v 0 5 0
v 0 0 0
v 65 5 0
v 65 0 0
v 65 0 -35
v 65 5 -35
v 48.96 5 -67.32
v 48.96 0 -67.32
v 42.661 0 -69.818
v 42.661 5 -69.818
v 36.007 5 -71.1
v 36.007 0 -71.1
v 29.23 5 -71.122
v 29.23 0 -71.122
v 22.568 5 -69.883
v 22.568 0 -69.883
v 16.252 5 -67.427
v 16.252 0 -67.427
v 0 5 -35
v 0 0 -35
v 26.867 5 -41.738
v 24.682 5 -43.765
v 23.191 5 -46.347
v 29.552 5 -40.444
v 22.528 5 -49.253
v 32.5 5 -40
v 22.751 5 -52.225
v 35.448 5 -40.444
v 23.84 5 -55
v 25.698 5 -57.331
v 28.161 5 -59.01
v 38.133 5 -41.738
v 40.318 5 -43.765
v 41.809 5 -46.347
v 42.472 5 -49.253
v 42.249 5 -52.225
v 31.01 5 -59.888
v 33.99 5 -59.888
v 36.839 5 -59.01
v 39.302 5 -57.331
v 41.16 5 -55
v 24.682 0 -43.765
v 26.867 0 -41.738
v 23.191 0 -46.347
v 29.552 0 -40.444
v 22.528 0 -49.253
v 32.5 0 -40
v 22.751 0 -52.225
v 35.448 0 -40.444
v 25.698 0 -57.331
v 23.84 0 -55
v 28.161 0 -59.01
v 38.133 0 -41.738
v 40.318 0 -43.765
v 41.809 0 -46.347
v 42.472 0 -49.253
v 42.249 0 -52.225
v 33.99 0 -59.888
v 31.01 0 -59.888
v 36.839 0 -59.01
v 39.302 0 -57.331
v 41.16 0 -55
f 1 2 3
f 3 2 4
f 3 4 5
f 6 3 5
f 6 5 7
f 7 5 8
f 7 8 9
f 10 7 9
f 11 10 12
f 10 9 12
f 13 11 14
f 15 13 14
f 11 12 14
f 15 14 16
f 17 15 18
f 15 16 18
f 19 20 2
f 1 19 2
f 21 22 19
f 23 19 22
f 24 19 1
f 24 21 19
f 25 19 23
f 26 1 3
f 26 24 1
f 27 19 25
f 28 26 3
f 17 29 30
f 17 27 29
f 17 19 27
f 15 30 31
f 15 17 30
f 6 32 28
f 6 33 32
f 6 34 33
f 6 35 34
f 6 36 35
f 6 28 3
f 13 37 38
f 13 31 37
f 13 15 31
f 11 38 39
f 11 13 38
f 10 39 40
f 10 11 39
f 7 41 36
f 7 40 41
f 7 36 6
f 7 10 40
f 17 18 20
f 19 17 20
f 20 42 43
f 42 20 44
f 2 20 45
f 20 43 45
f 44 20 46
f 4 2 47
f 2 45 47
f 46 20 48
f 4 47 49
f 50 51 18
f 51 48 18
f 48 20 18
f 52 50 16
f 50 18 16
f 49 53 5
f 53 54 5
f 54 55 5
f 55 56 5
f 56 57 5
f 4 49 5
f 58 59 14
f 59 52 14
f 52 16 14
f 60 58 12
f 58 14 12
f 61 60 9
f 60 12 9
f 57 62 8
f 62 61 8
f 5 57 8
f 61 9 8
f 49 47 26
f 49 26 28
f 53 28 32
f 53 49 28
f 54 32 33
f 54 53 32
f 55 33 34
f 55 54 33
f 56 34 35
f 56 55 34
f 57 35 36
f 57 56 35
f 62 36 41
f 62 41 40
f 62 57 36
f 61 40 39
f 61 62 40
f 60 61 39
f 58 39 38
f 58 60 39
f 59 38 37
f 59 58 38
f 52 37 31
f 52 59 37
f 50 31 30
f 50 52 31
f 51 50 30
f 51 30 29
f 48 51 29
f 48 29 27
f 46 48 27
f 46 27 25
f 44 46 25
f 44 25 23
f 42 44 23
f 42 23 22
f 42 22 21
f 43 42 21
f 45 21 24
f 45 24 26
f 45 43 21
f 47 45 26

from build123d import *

# Parameters (mm, degrees)
SKETCH1_R           = 10
BOSS_EXTRUDE1_DEPTH = 5


with BuildPart() as part:
    # Sketch1 → Boss-Extrude1 (new body)
    with BuildSketch(Plane(origin=(0, 0, 0), x_dir=(1, 0, 0), z_dir=(0, 1, 0))):
        with BuildLine():
            Line((0, 35), (0, 0))
            Line((0, 0), (65, 0))
            Line((65, 0), (65, 35))
            Line((65, 35), (48.959951679, 67.319800692))
            ThreePointArc((48.959951679, 67.319800692), (32.618975384, 71.269620496), (16.252437814, 67.427091283))
            Line((16.252437814, 67.427091283), (0, 35))
        make_face()
        with Locations(Location((32.5, 50, 0), (0, 0, 270))):
            Circle(SKETCH1_R, mode=Mode.SUBTRACT)
    extrude(amount=BOSS_EXTRUDE1_DEPTH)


solid = part.part
